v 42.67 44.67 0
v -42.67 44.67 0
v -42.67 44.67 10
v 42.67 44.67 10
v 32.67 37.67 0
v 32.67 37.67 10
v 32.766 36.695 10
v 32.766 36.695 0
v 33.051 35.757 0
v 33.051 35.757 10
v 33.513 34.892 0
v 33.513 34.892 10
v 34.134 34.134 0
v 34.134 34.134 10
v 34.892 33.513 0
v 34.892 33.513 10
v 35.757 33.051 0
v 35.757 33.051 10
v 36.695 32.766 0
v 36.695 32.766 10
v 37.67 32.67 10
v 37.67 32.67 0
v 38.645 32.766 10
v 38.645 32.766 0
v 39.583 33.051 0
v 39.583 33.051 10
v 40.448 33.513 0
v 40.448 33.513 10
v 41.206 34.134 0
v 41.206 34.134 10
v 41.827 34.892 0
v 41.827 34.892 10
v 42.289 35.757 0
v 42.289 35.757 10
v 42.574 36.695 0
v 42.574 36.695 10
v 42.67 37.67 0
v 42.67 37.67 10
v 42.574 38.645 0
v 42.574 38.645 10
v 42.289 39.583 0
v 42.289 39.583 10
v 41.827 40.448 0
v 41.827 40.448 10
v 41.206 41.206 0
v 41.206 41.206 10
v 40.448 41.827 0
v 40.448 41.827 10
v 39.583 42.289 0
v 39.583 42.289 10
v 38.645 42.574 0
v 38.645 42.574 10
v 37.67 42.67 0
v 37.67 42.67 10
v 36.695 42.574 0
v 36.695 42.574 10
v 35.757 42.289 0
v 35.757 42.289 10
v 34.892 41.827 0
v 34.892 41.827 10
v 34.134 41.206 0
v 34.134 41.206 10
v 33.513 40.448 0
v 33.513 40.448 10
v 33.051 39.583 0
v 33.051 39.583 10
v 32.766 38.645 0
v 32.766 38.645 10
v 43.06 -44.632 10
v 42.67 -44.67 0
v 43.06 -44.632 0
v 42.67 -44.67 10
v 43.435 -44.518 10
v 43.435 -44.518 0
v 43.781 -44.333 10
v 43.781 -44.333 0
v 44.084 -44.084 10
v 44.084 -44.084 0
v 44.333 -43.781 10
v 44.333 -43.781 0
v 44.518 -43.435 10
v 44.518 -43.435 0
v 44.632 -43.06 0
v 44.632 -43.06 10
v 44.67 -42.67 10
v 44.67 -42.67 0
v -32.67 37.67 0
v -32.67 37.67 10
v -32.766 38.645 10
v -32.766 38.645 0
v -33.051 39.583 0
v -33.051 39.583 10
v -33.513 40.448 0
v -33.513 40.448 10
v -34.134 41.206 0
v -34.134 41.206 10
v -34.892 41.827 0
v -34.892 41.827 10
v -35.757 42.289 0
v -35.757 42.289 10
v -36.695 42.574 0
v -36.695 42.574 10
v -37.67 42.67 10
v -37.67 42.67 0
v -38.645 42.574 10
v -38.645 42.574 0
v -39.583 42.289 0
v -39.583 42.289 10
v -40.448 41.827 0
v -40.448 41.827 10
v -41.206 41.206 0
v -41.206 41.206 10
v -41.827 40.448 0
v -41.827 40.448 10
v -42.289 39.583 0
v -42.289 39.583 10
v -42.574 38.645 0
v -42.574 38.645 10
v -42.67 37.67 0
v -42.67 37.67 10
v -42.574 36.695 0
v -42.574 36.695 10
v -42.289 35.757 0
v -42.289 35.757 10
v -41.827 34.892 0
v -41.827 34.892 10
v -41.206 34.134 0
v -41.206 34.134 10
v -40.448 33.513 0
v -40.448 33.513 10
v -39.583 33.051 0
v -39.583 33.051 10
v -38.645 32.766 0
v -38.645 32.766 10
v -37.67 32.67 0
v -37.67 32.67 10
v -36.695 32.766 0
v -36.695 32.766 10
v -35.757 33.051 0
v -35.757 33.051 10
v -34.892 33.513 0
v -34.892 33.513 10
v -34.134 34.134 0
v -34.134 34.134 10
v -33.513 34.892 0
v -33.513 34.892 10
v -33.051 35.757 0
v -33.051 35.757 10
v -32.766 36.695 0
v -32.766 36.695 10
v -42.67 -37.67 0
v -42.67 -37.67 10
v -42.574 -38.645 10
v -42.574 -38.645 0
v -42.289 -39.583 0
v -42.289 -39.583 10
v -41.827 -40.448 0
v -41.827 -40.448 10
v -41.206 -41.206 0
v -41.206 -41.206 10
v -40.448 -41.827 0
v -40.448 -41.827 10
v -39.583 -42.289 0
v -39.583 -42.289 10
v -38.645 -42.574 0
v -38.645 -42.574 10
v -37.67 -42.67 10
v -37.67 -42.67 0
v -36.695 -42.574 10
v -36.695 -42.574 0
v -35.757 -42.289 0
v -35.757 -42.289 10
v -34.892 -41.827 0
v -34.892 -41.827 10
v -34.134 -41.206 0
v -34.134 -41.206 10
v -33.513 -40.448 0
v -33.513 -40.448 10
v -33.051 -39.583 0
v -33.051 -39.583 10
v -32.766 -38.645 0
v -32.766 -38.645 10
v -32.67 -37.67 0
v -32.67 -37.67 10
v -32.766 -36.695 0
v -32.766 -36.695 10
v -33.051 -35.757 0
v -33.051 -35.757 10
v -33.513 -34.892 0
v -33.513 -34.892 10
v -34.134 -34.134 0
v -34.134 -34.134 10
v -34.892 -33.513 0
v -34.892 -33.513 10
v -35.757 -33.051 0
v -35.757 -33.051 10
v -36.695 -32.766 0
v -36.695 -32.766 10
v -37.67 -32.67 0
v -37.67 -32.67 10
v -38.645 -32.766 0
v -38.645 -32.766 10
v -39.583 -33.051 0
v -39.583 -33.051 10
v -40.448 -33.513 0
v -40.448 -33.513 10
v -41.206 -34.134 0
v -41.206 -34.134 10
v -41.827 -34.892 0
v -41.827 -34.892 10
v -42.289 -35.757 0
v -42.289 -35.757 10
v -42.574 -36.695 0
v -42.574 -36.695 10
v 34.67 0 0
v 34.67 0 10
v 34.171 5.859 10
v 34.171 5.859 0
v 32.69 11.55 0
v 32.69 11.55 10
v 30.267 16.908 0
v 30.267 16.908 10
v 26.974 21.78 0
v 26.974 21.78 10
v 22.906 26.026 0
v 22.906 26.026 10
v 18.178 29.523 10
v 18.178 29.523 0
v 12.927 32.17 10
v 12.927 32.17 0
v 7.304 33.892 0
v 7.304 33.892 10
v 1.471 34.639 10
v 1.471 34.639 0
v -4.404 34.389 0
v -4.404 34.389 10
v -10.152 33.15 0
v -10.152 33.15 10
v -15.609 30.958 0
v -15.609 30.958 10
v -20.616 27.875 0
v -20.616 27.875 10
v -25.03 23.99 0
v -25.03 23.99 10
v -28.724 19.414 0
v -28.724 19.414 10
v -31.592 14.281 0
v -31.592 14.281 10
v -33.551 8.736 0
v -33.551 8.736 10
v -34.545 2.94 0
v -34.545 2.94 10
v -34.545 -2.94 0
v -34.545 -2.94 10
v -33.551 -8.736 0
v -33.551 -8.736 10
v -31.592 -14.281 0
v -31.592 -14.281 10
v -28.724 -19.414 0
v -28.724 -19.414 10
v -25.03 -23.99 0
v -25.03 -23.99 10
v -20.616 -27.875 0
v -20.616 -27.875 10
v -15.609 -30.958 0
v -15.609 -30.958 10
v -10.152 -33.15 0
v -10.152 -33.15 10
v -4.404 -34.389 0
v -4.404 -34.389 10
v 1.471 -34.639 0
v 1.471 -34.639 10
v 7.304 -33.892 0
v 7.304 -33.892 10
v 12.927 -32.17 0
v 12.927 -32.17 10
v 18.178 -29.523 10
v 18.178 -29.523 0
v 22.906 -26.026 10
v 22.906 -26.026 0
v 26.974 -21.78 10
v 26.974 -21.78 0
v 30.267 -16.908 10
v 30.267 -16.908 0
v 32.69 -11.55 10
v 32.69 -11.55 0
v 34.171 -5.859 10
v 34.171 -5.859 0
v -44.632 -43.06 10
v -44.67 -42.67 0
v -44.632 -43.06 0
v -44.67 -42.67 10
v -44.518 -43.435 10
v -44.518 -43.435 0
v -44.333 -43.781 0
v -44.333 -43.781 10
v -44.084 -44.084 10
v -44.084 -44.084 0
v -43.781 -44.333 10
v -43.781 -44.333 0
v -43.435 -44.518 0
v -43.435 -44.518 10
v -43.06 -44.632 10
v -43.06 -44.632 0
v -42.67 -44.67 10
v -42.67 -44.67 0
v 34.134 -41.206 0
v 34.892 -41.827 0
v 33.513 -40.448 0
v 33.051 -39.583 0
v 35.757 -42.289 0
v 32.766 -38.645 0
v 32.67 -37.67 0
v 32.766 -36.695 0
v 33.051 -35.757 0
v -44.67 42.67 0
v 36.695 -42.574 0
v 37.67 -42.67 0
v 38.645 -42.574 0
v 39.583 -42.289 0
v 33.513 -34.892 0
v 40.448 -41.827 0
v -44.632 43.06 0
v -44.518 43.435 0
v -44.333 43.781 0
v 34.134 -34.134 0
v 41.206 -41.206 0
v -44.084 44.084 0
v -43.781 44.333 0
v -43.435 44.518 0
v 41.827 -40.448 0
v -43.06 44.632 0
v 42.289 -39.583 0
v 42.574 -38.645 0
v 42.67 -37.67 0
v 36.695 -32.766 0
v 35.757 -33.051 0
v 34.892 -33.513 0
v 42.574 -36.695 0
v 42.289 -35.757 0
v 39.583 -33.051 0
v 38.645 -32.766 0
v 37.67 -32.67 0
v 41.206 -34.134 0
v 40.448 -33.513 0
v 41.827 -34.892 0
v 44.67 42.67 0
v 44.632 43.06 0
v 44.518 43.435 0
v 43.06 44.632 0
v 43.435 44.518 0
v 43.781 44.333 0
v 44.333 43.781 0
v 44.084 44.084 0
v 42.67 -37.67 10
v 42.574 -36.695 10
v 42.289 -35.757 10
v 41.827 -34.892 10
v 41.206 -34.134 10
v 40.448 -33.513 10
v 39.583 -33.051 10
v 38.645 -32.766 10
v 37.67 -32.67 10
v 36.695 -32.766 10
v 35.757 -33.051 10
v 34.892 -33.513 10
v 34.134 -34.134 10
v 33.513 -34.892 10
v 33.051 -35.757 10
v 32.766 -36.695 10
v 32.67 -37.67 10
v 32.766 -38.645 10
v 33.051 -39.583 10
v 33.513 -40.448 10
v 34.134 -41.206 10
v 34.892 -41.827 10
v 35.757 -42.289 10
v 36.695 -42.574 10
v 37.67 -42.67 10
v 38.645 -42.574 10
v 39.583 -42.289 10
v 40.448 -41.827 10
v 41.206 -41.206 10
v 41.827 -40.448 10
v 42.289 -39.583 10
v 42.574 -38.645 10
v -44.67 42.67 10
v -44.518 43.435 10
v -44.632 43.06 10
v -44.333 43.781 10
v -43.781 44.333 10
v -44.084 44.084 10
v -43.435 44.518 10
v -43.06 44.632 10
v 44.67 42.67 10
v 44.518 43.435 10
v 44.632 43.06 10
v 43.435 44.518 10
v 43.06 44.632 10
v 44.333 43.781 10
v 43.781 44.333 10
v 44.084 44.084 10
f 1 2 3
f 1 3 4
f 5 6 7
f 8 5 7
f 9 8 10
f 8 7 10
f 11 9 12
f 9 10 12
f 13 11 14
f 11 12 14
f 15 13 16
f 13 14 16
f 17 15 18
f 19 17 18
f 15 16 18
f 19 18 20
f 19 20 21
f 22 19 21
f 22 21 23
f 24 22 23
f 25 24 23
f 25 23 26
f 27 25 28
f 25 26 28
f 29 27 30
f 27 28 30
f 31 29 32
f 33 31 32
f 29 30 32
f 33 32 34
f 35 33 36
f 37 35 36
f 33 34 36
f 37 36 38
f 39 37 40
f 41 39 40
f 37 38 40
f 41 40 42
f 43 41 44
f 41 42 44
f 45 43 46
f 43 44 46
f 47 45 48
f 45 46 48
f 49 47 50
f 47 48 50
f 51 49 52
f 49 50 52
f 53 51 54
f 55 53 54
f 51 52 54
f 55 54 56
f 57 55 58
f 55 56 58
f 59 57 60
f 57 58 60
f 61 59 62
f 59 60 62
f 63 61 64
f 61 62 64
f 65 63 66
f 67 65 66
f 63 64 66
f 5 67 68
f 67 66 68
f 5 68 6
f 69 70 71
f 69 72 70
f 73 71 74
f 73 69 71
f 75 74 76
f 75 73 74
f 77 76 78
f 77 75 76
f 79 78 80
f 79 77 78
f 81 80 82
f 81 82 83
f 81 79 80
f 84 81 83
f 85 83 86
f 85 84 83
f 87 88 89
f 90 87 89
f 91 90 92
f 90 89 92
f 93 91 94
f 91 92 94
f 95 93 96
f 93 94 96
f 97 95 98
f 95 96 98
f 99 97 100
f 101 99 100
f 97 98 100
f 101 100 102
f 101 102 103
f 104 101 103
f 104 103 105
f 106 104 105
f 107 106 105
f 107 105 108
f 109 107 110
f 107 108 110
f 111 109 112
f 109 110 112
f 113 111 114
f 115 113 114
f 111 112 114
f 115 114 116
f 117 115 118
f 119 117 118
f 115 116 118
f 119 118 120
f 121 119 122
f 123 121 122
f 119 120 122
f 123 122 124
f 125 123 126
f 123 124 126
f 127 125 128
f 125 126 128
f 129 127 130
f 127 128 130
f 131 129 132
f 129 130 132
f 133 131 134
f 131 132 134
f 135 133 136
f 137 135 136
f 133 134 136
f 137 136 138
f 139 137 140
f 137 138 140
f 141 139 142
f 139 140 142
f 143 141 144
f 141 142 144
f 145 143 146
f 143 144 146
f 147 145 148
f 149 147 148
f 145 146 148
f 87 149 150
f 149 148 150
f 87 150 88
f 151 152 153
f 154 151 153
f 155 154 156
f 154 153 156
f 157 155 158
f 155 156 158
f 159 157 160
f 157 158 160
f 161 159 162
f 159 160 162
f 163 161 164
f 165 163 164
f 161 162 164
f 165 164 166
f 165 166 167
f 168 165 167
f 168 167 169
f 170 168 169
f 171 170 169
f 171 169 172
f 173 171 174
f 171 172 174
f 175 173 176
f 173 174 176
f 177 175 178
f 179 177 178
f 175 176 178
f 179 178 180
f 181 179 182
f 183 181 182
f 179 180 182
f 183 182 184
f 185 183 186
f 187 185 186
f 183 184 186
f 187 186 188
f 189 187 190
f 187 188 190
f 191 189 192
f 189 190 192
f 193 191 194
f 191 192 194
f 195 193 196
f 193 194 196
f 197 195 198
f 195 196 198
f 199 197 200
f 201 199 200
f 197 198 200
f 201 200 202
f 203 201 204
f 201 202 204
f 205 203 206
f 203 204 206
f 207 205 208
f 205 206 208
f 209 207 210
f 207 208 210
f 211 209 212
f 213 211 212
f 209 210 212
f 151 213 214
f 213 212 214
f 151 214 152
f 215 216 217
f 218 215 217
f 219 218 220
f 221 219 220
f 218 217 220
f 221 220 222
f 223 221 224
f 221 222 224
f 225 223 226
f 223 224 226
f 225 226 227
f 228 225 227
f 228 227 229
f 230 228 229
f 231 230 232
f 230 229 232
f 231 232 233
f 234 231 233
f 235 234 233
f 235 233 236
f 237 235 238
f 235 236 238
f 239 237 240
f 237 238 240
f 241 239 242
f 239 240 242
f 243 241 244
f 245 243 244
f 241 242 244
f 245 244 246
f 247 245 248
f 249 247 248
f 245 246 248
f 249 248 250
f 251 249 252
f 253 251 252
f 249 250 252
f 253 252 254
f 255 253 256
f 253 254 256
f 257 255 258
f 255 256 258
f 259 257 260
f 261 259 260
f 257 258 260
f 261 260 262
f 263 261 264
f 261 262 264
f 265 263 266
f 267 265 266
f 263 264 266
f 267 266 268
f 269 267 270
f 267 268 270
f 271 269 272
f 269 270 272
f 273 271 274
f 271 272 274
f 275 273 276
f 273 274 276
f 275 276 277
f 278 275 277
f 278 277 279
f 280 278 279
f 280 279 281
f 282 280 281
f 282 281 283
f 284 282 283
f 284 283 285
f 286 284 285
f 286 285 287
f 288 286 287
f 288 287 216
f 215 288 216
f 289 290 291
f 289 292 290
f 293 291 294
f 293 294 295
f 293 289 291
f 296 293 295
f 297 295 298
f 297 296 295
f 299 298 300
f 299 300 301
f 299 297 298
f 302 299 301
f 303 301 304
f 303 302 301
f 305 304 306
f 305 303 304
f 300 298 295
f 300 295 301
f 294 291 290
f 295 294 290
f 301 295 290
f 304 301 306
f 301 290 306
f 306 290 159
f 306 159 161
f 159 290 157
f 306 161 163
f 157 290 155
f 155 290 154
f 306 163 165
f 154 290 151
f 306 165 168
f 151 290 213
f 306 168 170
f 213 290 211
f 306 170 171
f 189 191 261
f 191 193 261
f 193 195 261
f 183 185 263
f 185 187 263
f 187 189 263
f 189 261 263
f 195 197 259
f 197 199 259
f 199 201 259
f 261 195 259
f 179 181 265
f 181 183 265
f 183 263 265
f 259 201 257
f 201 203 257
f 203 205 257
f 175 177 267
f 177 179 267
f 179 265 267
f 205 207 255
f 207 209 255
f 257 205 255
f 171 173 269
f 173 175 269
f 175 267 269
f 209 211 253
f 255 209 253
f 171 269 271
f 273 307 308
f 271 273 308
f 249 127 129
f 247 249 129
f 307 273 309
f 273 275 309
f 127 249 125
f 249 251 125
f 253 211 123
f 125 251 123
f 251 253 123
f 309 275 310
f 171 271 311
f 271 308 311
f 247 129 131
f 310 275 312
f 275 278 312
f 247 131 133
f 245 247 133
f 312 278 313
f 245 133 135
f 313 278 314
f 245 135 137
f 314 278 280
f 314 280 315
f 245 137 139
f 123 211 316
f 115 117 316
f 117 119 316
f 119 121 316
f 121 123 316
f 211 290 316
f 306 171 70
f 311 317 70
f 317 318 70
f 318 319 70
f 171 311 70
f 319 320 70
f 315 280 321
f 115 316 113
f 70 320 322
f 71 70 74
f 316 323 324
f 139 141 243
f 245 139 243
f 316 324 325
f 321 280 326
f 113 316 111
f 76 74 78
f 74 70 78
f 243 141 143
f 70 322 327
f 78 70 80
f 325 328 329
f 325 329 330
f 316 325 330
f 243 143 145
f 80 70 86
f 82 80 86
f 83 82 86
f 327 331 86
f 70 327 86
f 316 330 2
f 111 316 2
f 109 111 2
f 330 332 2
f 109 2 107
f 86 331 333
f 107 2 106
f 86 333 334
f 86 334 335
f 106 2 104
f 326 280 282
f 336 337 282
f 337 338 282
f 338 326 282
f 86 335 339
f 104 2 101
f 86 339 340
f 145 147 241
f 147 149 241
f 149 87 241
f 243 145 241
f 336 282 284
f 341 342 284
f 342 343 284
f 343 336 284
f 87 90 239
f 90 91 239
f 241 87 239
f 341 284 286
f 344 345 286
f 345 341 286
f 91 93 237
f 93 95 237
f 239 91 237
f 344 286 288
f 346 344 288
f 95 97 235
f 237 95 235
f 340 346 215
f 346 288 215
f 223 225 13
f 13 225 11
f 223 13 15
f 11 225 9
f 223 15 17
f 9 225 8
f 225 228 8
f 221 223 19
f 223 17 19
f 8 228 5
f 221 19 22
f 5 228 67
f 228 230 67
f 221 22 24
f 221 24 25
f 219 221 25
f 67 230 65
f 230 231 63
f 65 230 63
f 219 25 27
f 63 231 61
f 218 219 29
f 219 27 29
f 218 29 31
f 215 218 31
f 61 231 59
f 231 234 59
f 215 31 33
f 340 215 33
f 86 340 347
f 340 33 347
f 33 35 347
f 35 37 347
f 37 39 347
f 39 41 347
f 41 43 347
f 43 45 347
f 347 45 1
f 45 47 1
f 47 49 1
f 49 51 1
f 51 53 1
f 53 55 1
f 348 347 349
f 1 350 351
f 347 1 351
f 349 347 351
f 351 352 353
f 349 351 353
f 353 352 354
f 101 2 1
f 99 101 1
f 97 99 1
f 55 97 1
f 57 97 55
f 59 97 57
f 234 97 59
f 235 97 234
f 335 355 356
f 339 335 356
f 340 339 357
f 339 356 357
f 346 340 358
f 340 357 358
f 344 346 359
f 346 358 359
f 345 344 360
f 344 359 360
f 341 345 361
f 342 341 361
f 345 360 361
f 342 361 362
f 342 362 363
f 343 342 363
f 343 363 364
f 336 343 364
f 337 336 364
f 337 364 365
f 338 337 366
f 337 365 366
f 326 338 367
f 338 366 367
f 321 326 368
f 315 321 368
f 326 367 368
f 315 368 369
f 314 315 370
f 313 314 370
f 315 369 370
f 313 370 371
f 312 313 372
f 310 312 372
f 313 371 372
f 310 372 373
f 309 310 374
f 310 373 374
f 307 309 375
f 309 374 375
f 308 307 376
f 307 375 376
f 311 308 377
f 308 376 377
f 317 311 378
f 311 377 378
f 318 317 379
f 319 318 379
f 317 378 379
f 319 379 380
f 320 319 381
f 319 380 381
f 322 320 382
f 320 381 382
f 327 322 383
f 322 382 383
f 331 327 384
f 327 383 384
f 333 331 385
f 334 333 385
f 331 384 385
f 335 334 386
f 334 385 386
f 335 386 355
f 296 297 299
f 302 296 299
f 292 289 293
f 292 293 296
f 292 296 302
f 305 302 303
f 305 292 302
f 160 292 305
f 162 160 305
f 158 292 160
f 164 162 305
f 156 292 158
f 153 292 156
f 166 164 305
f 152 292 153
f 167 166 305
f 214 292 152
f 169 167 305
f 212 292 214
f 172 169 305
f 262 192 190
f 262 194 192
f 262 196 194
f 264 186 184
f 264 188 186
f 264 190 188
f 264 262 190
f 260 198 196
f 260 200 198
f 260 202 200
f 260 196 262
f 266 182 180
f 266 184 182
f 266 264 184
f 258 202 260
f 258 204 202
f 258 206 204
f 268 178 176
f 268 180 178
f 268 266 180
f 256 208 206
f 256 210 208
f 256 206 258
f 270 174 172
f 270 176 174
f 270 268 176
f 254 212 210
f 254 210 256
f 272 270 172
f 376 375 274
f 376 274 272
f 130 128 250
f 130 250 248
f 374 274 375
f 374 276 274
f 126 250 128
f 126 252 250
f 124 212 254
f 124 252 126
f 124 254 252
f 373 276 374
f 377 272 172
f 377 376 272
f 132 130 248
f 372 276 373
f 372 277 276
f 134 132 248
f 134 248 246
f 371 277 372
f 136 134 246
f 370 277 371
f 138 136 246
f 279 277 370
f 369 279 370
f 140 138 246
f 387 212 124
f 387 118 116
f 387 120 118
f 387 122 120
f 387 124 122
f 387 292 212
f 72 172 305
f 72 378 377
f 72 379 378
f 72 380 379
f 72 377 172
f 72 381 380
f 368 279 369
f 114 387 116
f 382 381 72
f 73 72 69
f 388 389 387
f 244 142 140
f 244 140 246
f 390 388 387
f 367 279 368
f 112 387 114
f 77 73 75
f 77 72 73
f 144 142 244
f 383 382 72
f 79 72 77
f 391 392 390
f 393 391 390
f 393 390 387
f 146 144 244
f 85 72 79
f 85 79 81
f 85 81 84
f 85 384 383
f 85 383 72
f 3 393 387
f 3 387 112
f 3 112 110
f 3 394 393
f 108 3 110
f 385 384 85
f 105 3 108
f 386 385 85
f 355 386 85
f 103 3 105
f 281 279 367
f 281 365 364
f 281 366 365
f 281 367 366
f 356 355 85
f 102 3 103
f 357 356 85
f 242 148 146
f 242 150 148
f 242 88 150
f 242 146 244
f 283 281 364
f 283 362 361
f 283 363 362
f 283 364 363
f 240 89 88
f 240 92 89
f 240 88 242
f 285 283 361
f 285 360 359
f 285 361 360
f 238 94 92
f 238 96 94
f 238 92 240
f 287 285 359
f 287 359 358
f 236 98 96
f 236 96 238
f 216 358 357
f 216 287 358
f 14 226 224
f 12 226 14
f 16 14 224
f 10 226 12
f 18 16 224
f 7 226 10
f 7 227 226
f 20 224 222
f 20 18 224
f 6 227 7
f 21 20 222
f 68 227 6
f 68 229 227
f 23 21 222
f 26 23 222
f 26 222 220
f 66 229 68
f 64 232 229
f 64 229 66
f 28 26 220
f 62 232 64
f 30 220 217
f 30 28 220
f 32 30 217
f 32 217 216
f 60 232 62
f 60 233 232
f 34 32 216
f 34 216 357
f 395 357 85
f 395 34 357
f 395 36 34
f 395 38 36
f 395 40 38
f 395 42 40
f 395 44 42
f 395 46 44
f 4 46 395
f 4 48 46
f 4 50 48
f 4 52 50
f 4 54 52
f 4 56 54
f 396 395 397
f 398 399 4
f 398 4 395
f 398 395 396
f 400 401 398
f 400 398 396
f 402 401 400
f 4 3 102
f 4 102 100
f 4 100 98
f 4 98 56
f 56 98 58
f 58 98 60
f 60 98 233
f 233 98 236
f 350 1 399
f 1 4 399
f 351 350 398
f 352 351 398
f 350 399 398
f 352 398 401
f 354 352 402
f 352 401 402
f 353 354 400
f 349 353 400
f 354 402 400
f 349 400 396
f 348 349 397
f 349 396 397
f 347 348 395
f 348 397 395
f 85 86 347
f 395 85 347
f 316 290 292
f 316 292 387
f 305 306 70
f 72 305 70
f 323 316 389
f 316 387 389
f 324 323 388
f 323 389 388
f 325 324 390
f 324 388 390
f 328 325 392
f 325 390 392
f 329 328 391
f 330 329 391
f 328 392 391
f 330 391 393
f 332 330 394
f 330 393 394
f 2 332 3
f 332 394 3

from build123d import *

# Parameters (mm, degrees)
CROQUIS1_W              = 89.34
CROQUIS1_H              = 89.34
SALIENTE_EXTRUIR2_DEPTH = 10
CROQUIS3_R              = 34.67
CORTAR_EXTRUIR2_DEPTH   = 10
CROQUIS4_R              = 5
CORTAR_EXTRUIR3_DEPTH   = 10
REDONDEO2_R             = 2


with BuildPart() as part:
    # Croquis1 → Saliente-Extruir2 (new body)
    with BuildSketch(Plane.XY):
        Rectangle(CROQUIS1_W, CROQUIS1_H)
    extrude(amount=SALIENTE_EXTRUIR2_DEPTH)

    # Croquis3 → Cortar-Extruir2 (cut)
    with BuildSketch(Plane.XY.offset(10)):
        Circle(CROQUIS3_R)
    extrude(amount=-CORTAR_EXTRUIR2_DEPTH, mode=Mode.SUBTRACT)

    # Croquis4 → Cortar-Extruir3 (cut)
    with BuildSketch(Plane.XY.offset(10)):
        with Locations((37.67, -37.67)):
            Circle(CROQUIS4_R)
        with Locations(Location((-37.67, -37.67, 0), (0, 0, 180))):
            Circle(CROQUIS4_R)
        with Locations((-37.67, 37.67)):
            Circle(CROQUIS4_R)
        with Locations(Location((37.67, 37.67, 0), (0, 0, 180))):
            Circle(CROQUIS4_R)
    extrude(amount=-CORTAR_EXTRUIR3_DEPTH, mode=Mode.SUBTRACT)

    # Redondeo2
    redondeo2_edges = [part.edges().sort_by_distance(p)[0] for p in [
        (-44.67, -44.67, 5),
        (-44.67, 44.67, 5),
        (44.67, 44.67, 5),
        (44.67, -44.67, 5),
    ]]
    fillet(redondeo2_edges, radius=REDONDEO2_R)


solid = part.part
